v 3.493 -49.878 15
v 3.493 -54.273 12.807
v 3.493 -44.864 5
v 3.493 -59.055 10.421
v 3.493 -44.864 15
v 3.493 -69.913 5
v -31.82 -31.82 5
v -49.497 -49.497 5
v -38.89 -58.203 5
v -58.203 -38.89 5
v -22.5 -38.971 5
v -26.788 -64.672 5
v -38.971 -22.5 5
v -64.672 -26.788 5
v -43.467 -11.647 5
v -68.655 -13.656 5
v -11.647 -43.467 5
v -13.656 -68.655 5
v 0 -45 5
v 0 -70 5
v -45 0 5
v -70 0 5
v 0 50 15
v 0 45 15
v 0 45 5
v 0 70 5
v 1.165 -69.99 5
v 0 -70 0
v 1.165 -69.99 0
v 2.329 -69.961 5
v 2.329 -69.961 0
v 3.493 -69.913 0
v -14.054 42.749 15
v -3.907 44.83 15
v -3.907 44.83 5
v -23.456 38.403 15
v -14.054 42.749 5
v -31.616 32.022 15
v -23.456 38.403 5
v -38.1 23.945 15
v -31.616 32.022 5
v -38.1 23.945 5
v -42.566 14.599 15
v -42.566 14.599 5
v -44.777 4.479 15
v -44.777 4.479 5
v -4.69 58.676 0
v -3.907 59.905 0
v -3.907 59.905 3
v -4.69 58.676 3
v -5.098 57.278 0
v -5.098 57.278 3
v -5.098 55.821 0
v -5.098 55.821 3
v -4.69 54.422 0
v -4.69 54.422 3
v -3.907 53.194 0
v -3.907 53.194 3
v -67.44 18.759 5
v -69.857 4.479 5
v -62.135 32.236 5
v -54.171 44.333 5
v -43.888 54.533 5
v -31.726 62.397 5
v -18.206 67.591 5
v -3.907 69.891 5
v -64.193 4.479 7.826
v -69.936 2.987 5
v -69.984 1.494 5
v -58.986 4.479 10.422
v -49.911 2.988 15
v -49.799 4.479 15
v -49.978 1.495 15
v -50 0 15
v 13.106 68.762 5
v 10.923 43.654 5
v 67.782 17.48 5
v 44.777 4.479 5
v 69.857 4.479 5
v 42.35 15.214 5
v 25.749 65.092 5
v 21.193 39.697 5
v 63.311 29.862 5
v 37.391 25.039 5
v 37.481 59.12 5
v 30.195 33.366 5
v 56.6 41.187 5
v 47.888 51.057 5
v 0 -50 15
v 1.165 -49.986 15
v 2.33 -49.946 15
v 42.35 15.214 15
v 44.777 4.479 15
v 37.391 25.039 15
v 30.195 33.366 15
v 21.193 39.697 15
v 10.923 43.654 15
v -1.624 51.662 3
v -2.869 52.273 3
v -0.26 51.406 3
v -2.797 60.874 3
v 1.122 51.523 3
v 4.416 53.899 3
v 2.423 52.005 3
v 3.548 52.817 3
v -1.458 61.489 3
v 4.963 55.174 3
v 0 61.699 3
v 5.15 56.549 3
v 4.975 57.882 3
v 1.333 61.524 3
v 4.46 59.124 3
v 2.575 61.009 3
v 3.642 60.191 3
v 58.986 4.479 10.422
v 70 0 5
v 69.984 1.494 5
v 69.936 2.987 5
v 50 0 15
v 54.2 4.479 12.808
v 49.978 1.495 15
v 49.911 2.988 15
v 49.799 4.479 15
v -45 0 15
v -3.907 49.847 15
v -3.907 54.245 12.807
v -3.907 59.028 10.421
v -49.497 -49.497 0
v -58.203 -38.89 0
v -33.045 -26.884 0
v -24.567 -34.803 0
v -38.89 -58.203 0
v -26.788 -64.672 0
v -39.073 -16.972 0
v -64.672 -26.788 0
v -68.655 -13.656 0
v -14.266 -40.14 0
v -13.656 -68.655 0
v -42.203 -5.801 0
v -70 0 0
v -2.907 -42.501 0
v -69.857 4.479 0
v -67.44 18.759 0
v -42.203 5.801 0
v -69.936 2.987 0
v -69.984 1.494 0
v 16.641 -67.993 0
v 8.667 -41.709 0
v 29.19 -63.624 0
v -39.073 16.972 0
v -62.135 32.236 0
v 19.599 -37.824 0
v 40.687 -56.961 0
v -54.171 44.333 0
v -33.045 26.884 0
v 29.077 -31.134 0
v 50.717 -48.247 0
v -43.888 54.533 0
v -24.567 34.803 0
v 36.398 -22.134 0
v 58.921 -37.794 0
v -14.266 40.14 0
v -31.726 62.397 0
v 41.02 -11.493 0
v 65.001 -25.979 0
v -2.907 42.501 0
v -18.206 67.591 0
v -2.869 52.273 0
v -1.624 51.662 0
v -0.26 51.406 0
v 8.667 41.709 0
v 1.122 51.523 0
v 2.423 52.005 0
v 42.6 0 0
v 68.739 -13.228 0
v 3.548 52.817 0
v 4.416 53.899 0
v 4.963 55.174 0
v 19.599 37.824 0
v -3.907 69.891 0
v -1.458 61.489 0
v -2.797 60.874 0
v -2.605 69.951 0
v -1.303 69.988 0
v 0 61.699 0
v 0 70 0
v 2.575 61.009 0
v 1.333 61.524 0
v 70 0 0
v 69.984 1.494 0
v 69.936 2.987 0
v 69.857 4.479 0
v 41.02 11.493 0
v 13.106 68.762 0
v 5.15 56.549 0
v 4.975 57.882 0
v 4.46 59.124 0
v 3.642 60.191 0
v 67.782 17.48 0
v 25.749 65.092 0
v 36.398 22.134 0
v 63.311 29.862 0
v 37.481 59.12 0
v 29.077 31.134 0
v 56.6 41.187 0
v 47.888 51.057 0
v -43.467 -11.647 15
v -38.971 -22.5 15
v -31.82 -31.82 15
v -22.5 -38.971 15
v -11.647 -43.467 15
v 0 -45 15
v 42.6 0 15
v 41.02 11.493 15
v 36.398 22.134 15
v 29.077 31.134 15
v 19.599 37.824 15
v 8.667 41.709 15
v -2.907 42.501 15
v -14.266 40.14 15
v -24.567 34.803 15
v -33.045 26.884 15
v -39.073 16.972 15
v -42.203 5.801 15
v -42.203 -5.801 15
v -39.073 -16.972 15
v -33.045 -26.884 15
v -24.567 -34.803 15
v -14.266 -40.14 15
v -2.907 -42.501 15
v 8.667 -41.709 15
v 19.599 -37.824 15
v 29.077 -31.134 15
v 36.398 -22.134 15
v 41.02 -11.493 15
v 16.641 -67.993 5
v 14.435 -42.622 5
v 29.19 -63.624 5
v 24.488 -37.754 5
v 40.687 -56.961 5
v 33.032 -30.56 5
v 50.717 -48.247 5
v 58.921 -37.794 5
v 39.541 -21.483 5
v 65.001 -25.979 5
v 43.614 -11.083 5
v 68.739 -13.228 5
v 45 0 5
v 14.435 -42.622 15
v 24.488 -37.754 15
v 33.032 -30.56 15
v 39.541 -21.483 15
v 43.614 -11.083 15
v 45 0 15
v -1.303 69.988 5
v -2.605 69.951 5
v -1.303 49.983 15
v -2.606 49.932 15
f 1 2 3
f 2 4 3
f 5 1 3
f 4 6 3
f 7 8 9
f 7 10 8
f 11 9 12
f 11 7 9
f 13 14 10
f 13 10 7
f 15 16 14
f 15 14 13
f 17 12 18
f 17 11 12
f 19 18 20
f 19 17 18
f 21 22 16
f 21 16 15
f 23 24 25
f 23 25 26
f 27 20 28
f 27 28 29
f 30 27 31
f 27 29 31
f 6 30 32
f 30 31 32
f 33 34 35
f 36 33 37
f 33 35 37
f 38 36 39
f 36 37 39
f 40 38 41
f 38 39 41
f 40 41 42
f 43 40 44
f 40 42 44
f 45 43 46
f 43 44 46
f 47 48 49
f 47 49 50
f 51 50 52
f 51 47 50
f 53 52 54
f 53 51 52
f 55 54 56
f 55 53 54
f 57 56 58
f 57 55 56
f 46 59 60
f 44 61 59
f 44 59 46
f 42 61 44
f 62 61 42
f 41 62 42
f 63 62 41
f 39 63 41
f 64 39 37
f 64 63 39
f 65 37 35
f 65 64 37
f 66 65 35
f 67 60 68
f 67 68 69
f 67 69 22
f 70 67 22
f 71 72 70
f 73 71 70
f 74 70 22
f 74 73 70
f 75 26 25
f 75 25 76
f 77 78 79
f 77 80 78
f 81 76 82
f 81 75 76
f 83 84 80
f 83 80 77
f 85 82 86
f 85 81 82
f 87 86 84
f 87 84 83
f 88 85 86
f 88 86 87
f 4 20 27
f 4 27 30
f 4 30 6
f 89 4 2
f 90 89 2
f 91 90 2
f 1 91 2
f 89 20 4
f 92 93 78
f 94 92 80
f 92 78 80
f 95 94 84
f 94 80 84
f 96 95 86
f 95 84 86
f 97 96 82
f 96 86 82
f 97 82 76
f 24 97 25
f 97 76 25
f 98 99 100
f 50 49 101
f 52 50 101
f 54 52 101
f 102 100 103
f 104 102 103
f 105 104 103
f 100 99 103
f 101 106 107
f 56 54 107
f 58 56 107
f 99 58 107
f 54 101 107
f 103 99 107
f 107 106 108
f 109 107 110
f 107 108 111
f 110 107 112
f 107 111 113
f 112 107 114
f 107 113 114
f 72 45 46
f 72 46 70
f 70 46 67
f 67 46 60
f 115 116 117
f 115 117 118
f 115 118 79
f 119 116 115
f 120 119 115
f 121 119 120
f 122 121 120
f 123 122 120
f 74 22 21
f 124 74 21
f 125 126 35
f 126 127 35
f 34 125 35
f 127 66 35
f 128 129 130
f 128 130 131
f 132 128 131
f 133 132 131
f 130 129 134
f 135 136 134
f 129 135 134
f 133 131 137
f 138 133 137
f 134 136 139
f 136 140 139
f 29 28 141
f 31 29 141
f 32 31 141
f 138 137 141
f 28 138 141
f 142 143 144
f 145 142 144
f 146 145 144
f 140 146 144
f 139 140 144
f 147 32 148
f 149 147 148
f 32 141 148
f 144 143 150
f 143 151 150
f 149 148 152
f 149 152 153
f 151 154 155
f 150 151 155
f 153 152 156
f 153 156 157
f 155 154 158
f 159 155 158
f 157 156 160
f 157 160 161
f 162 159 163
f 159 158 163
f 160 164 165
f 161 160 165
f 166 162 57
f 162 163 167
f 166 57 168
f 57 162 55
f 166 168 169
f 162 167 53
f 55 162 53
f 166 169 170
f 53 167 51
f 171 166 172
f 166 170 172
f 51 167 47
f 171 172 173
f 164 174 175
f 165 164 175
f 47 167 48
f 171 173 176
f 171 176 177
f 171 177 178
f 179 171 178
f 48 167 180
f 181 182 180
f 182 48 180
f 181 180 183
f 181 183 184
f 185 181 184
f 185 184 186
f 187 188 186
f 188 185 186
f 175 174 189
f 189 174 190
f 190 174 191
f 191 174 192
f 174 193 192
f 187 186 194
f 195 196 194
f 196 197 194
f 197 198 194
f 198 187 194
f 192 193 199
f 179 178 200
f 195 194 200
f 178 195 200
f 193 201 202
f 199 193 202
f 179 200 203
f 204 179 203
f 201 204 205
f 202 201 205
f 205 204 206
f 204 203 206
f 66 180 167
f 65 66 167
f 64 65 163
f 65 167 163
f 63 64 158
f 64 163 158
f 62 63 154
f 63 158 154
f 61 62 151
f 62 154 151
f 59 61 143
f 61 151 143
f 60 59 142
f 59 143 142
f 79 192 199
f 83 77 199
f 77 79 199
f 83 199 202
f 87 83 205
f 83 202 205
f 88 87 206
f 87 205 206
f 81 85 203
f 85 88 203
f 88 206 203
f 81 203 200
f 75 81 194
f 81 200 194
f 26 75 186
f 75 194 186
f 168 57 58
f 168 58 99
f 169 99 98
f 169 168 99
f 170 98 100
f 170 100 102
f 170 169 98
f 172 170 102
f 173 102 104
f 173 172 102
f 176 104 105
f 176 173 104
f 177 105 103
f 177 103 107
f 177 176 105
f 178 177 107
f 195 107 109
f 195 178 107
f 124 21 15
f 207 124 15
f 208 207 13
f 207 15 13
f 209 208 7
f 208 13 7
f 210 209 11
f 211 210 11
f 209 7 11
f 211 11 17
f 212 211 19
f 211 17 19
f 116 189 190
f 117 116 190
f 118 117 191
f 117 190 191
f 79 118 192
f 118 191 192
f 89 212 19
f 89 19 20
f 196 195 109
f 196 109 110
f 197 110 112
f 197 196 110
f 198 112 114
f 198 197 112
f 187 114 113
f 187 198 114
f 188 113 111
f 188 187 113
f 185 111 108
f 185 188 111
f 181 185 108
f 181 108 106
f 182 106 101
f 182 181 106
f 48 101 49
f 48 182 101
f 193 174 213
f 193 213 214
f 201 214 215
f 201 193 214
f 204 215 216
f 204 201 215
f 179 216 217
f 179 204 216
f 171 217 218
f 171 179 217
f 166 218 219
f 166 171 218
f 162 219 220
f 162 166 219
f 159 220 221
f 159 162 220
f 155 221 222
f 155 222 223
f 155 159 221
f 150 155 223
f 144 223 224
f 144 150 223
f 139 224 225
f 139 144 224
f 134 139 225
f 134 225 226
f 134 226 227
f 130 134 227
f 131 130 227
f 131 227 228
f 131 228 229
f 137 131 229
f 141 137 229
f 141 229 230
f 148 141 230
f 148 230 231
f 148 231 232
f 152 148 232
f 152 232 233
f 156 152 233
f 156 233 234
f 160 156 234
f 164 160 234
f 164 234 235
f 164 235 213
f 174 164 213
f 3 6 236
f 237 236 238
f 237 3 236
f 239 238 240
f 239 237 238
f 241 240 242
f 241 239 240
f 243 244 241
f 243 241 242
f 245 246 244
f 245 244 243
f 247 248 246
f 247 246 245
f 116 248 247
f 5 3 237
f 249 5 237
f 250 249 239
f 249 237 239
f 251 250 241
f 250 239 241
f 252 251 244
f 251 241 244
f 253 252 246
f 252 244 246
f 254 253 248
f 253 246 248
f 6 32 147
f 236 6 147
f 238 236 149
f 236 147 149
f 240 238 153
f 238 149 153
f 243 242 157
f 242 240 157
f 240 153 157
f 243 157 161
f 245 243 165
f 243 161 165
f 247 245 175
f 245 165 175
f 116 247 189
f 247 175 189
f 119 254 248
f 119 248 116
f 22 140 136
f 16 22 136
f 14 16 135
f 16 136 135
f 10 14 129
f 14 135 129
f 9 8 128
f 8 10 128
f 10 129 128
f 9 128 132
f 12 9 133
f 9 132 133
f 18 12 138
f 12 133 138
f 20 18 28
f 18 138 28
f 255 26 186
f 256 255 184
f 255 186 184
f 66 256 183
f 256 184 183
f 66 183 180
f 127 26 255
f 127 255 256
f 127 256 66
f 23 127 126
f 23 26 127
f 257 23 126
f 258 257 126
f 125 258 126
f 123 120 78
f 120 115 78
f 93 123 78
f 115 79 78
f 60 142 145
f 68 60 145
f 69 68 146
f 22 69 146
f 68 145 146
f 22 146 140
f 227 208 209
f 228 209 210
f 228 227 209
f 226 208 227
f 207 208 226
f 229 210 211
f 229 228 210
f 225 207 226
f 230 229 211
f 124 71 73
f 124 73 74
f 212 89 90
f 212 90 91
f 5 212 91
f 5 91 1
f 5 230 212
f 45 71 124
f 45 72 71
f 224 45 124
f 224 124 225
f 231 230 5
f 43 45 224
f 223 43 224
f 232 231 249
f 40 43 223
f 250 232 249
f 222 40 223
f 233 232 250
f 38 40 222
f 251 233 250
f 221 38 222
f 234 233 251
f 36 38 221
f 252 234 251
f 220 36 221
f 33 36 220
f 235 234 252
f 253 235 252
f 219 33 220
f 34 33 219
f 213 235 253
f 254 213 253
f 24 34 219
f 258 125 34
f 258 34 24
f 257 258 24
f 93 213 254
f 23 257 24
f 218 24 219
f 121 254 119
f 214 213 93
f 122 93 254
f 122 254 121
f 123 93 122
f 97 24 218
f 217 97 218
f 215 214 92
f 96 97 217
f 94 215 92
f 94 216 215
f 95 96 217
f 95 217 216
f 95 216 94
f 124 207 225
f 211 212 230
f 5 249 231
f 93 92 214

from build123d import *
from build123d import SkipClean  # not in build123d's __all__

# Parameters (mm, degrees)
F0_R        = 42.6
F1_DEPTH    = 5
F2_DEPTH    = 15
F3_DEPTH    = 3
F4_START    = 5
F4_DEPTH    = 10
F5_T2_ANGLE = 88.4610047723
F5_T4_ANGLE = 87.6524613708
F5_T6_ANGLE = 88.4610047722
F5_T8_ANGLE = 87.9917435352


# Not quite as in the source:
# - a fillet or chamfer that OpenCascade refuses, or shapes differently, is made with other operations: its cross-section is extruded or revolved along the edge and cut away or added


with BuildPart() as f1:
    # F0 (on Top) → F1 (new body)
    with BuildSketch(Plane.XY):
        with BuildLine():
            Line((45, 0), (70, 0))
            ThreePointArc((70, 0), (69.9641265525, 2.2407578514), (69.8565429786, 4.4792190254))
            Line((69.8565429786, 4.4792190254), (44.7765183654, 4.4792190254))
            ThreePointArc((44.7765183654, 4.4792190254), (44.9440948648, 2.2423953219), (45, 0))
        make_face()
        with BuildLine():
            Line((44.7765183654, 4.4792190254), (69.8565429786, 4.4792190254))
            ThreePointArc((69.8565429786, 4.4792190254), (47.8876532533, 51.0565633968), (0, 70))
            Line((0, 70), (0, 61.6992585301))
            ThreePointArc((0, 61.6992585301), (3.6415999231, 60.1908584533), (5.15, 56.5492585301))
            ThreePointArc((5.15, 56.5492585301), (3.6415999231, 52.907658607), (0, 51.3992585301))
            Line((0, 51.3992585301), (0, 45))
            ThreePointArc((0, 45), (30.194661315, 33.3658871914), (44.7765183654, 4.4792190254))
        make_face()
        with BuildLine():
            Line((0, 61.6992585301), (0, 70))
            ThreePointArc((0, 70), (-1.9542396645, 69.972715735), (-3.9069559007, 69.8908842095))
            Line((-3.9069559007, 69.8908842095), (-3.9069559007, 59.9045820004))
            ThreePointArc((-3.9069559007, 59.9045820004), (-2.1497190663, 61.2291311711), (0, 61.6992585301))
        make_face()
        with BuildLine():
            Line((-3.9069559007, 59.9045820004), (-3.9069559007, 69.8908842095))
            ThreePointArc((-3.9069559007, 69.8908842095), (-49.2943701377, 49.699749222), (-69.8565429786, 4.4792190254))
            Line((-69.8565429786, 4.4792190254), (-44.7765183654, 4.4792190254))
            ThreePointArc((-44.7765183654, 4.4792190254), (-31.6159465637, 32.0223659788), (-3.9069559007, 44.8300757928))
            Line((-3.9069559007, 44.8300757928), (-3.9069559007, 53.1939350599))
            ThreePointArc((-3.9069559007, 53.1939350599), (-5.15, 56.5492585301), (-3.9069559007, 59.9045820004))
        make_face()
        with BuildLine():
            ThreePointArc((-69.8565429786, 4.4792190254), (-69.9641265525, 2.2407578514), (-70, 0))
            Line((-70, 0), (-45, 0))
            ThreePointArc((-45, 0), (-44.9440948648, 2.2423953219), (-44.7765183654, 4.4792190254))
            Line((-44.7765183654, 4.4792190254), (-69.8565429786, 4.4792190254))
        make_face()
        with BuildLine():
            ThreePointArc((-70, 0), (-49.4974746831, -49.4974746831), (0, -70))
            Line((0, -70), (0, -45))
            ThreePointArc((0, -45), (-31.8198051534, -31.8198051534), (-45, 0))
            Line((-45, 0), (-70, 0))
        make_face()
        with BuildLine():
            ThreePointArc((0, -70), (1.7470617825, -69.9781949976), (3.4930351455, -69.9127935751))
            Line((3.4930351455, -69.9127935751), (3.4930351455, -44.8642252298))
            ThreePointArc((3.4930351455, -44.8642252298), (1.7478364709, -44.9660434959), (0, -45))
            Line((0, -45), (0, -70))
        make_face()
        with BuildLine():
            ThreePointArc((3.4930351455, -69.9127935751), (50.7174154516, -48.2466969844), (70, 0))
            Line((70, 0), (45, 0))
            ThreePointArc((45, 0), (33.0317013, -30.5598872581), (3.4930351455, -44.8642252298))
            Line((3.4930351455, -44.8642252298), (3.4930351455, -69.9127935751))
        make_face()
        with BuildLine():
            Line((0, 51.3992585301), (0, 61.6992585301))
            ThreePointArc((0, 61.6992585301), (-2.1497190663, 61.2291311711), (-3.9069559007, 59.9045820004))
            Line((-3.9069559007, 59.9045820004), (-3.9069559007, 53.1939350599))
            ThreePointArc((-3.9069559007, 53.1939350599), (-2.1497190663, 51.8693858891), (0, 51.3992585301))
        make_face()
        with BuildLine():
            Line((-3.9069559007, 53.1939350599), (-3.9069559007, 59.9045820004))
            ThreePointArc((-3.9069559007, 59.9045820004), (-5.15, 56.5492585301), (-3.9069559007, 53.1939350599))
        make_face()
        with BuildLine():
            ThreePointArc((5.15, 56.5492585301), (3.6415999231, 60.1908584533), (0, 61.6992585301))
            Line((0, 61.6992585301), (0, 51.3992585301))
            ThreePointArc((0, 51.3992585301), (3.6415999231, 52.907658607), (5.15, 56.5492585301))
        make_face()
        with BuildLine():
            ThreePointArc((-3.9069559007, 44.8300757928), (-1.9553246946, 44.9574988777), (0, 45))
            Line((0, 45), (0, 51.3992585301))
            ThreePointArc((0, 51.3992585301), (-2.1497190663, 51.8693858891), (-3.9069559007, 53.1939350599))
            Line((-3.9069559007, 53.1939350599), (-3.9069559007, 44.8300757928))
        make_face()
        with BuildLine():
            ThreePointArc((3.4930351455, -44.8642252298), (33.0317013, -30.5598872581), (45, 0))
            ThreePointArc((45, 0), (44.9440948648, 2.2423953219), (44.7765183654, 4.4792190254))
            ThreePointArc((44.7765183654, 4.4792190254), (30.194661315, 33.3658871914), (0, 45))
            ThreePointArc((0, 45), (-1.9553246946, 44.9574988777), (-3.9069559007, 44.8300757928))
            ThreePointArc((-3.9069559007, 44.8300757928), (-31.6159465637, 32.0223659788), (-44.7765183654, 4.4792190254))
            ThreePointArc((-44.7765183654, 4.4792190254), (-44.9440948648, 2.2423953219), (-45, 0))
            ThreePointArc((-45, 0), (-31.8198051534, -31.8198051534), (0, -45))
            ThreePointArc((0, -45), (1.7478364709, -44.9660434959), (3.4930351455, -44.8642252298))
        make_face()
        Circle(F0_R, mode=Mode.SUBTRACT)
    extrude(amount=F1_DEPTH)

    # F0 (on Top) → F2 (join)
    with BuildSketch(Plane.XY):
        with BuildLine():
            ThreePointArc((3.4930351455, -44.8642252298), (33.0317013, -30.5598872581), (45, 0))
            ThreePointArc((45, 0), (44.9440948648, 2.2423953219), (44.7765183654, 4.4792190254))
            ThreePointArc((44.7765183654, 4.4792190254), (30.194661315, 33.3658871914), (0, 45))
            ThreePointArc((0, 45), (-1.9553246946, 44.9574988777), (-3.9069559007, 44.8300757928))
            ThreePointArc((-3.9069559007, 44.8300757928), (-31.6159465637, 32.0223659788), (-44.7765183654, 4.4792190254))
            ThreePointArc((-44.7765183654, 4.4792190254), (-44.9440948648, 2.2423953219), (-45, 0))
            ThreePointArc((-45, 0), (-31.8198051534, -31.8198051534), (0, -45))
            ThreePointArc((0, -45), (1.7478364709, -44.9660434959), (3.4930351455, -44.8642252298))
        make_face()
        Circle(F0_R, mode=Mode.SUBTRACT)
    extrude(amount=F2_DEPTH)

    # F0 (on Top) → F3 (cut)
    with BuildSketch(Plane.XY):
        with BuildLine():
            Line((0, 51.3992585301), (0, 61.6992585301))
            ThreePointArc((0, 61.6992585301), (-2.1497190663, 61.2291311711), (-3.9069559007, 59.9045820004))
            Line((-3.9069559007, 59.9045820004), (-3.9069559007, 53.1939350599))
            ThreePointArc((-3.9069559007, 53.1939350599), (-2.1497190663, 51.8693858891), (0, 51.3992585301))
        make_face()
        with BuildLine():
            ThreePointArc((5.15, 56.5492585301), (3.6415999231, 60.1908584533), (0, 61.6992585301))
            Line((0, 61.6992585301), (0, 51.3992585301))
            ThreePointArc((0, 51.3992585301), (3.6415999231, 52.907658607), (5.15, 56.5492585301))
        make_face()
        with BuildLine():
            Line((-3.9069559007, 53.1939350599), (-3.9069559007, 59.9045820004))
            ThreePointArc((-3.9069559007, 59.9045820004), (-5.15, 56.5492585301), (-3.9069559007, 53.1939350599))
        make_face()
    extrude(amount=F3_DEPTH, mode=Mode.SUBTRACT)

    # F0 (on Top) → F4 (join)
    with BuildSketch(Plane.XY.offset(F4_START)):
        with BuildLine():
            ThreePointArc((0, -70), (1.7470617825, -69.9781949976), (3.4930351455, -69.9127935751))
            Line((3.4930351455, -69.9127935751), (3.4930351455, -44.8642252298))
            ThreePointArc((3.4930351455, -44.8642252298), (1.7478364709, -44.9660434959), (0, -45))
            Line((0, -45), (0, -70))
        make_face()
        with BuildLine():
            ThreePointArc((-69.8565429786, 4.4792190254), (-69.9641265525, 2.2407578514), (-70, 0))
            Line((-70, 0), (-45, 0))
            ThreePointArc((-45, 0), (-44.9440948648, 2.2423953219), (-44.7765183654, 4.4792190254))
            Line((-44.7765183654, 4.4792190254), (-69.8565429786, 4.4792190254))
        make_face()
        with BuildLine():
            Line((45, 0), (70, 0))
            ThreePointArc((70, 0), (69.9641265525, 2.2407578514), (69.8565429786, 4.4792190254))
            Line((69.8565429786, 4.4792190254), (44.7765183654, 4.4792190254))
            ThreePointArc((44.7765183654, 4.4792190254), (44.9440948648, 2.2423953219), (45, 0))
        make_face()
        with BuildLine():
            Line((0, 51.3992585301), (0, 61.6992585301))
            ThreePointArc((0, 61.6992585301), (-2.1497190663, 61.2291311711), (-3.9069559007, 59.9045820004))
            Line((-3.9069559007, 59.9045820004), (-3.9069559007, 53.1939350599))
            ThreePointArc((-3.9069559007, 53.1939350599), (-2.1497190663, 51.8693858891), (0, 51.3992585301))
        make_face()
        with BuildLine():
            Line((0, 61.6992585301), (0, 70))
            ThreePointArc((0, 70), (-1.9542396645, 69.972715735), (-3.9069559007, 69.8908842095))
            Line((-3.9069559007, 69.8908842095), (-3.9069559007, 59.9045820004))
            ThreePointArc((-3.9069559007, 59.9045820004), (-2.1497190663, 61.2291311711), (0, 61.6992585301))
        make_face()
        with BuildLine():
            ThreePointArc((-3.9069559007, 44.8300757928), (-1.9553246946, 44.9574988777), (0, 45))
            Line((0, 45), (0, 51.3992585301))
            ThreePointArc((0, 51.3992585301), (-2.1497190663, 51.8693858891), (-3.9069559007, 53.1939350599))
            Line((-3.9069559007, 53.1939350599), (-3.9069559007, 44.8300757928))
        make_face()
    with SkipClean():  # cleaning this boolean's faces spoils the solid; the shape is the same uncleaned
        extrude(amount=F4_DEPTH)

    # F5: chamfer of 20 x 10 on 4 edges, made by hand

    # F5_s1 → F5_t2 (revolve, cut)
    with BuildSketch(Plane(origin=(0, 0, 0), x_dir=(0, 0, 1), z_dir=(-0.6742521694, -0.738501193, 0))):
        Polygon((5, -70), (15, -50), (15, -70), align=None)
    revolve(axis=Axis((0, 0, 15), (0, 0, 1)), revolution_arc=F5_T2_ANGLE, mode=Mode.SUBTRACT)

    # F5_s3 → F5_t4 (revolve, cut)
    with BuildSketch(Plane(origin=(0, 0, 0), x_dir=(0, 0, 1), z_dir=(-0.7385013236, 0.6742520264, 0))):
        Polygon((5, -70), (15, -50), (15, -70), align=None)
    revolve(axis=Axis((0, 0, 15), (0, 0, 1)), revolution_arc=F5_T4_ANGLE, mode=Mode.SUBTRACT)

    # F5_s5 → F5_t6 (revolve, cut)
    with BuildSketch(Plane(origin=(0, 0, 0), x_dir=(0, 0, 1), z_dir=(0.7201262035, 0.6938431026, 0))):
        Polygon((5, -70), (15, -50), (15, -70), align=None)
    revolve(axis=Axis((0, 0, 15), (0, 0, 1)), revolution_arc=F5_T6_ANGLE, mode=Mode.SUBTRACT)

    # F5_s7 → F5_t8 (revolve, cut)
    with BuildSketch(Plane(origin=(0, 0, 0), x_dir=(0, 0, 1), z_dir=(0.7385012727, -0.6742520821, 0))):
        Polygon((5, -70), (15, -50), (15, -70), align=None)
    revolve(axis=Axis((0, 0, 15), (0, 0, 1)), revolution_arc=F5_T8_ANGLE, mode=Mode.SUBTRACT)


solid = f1.part
